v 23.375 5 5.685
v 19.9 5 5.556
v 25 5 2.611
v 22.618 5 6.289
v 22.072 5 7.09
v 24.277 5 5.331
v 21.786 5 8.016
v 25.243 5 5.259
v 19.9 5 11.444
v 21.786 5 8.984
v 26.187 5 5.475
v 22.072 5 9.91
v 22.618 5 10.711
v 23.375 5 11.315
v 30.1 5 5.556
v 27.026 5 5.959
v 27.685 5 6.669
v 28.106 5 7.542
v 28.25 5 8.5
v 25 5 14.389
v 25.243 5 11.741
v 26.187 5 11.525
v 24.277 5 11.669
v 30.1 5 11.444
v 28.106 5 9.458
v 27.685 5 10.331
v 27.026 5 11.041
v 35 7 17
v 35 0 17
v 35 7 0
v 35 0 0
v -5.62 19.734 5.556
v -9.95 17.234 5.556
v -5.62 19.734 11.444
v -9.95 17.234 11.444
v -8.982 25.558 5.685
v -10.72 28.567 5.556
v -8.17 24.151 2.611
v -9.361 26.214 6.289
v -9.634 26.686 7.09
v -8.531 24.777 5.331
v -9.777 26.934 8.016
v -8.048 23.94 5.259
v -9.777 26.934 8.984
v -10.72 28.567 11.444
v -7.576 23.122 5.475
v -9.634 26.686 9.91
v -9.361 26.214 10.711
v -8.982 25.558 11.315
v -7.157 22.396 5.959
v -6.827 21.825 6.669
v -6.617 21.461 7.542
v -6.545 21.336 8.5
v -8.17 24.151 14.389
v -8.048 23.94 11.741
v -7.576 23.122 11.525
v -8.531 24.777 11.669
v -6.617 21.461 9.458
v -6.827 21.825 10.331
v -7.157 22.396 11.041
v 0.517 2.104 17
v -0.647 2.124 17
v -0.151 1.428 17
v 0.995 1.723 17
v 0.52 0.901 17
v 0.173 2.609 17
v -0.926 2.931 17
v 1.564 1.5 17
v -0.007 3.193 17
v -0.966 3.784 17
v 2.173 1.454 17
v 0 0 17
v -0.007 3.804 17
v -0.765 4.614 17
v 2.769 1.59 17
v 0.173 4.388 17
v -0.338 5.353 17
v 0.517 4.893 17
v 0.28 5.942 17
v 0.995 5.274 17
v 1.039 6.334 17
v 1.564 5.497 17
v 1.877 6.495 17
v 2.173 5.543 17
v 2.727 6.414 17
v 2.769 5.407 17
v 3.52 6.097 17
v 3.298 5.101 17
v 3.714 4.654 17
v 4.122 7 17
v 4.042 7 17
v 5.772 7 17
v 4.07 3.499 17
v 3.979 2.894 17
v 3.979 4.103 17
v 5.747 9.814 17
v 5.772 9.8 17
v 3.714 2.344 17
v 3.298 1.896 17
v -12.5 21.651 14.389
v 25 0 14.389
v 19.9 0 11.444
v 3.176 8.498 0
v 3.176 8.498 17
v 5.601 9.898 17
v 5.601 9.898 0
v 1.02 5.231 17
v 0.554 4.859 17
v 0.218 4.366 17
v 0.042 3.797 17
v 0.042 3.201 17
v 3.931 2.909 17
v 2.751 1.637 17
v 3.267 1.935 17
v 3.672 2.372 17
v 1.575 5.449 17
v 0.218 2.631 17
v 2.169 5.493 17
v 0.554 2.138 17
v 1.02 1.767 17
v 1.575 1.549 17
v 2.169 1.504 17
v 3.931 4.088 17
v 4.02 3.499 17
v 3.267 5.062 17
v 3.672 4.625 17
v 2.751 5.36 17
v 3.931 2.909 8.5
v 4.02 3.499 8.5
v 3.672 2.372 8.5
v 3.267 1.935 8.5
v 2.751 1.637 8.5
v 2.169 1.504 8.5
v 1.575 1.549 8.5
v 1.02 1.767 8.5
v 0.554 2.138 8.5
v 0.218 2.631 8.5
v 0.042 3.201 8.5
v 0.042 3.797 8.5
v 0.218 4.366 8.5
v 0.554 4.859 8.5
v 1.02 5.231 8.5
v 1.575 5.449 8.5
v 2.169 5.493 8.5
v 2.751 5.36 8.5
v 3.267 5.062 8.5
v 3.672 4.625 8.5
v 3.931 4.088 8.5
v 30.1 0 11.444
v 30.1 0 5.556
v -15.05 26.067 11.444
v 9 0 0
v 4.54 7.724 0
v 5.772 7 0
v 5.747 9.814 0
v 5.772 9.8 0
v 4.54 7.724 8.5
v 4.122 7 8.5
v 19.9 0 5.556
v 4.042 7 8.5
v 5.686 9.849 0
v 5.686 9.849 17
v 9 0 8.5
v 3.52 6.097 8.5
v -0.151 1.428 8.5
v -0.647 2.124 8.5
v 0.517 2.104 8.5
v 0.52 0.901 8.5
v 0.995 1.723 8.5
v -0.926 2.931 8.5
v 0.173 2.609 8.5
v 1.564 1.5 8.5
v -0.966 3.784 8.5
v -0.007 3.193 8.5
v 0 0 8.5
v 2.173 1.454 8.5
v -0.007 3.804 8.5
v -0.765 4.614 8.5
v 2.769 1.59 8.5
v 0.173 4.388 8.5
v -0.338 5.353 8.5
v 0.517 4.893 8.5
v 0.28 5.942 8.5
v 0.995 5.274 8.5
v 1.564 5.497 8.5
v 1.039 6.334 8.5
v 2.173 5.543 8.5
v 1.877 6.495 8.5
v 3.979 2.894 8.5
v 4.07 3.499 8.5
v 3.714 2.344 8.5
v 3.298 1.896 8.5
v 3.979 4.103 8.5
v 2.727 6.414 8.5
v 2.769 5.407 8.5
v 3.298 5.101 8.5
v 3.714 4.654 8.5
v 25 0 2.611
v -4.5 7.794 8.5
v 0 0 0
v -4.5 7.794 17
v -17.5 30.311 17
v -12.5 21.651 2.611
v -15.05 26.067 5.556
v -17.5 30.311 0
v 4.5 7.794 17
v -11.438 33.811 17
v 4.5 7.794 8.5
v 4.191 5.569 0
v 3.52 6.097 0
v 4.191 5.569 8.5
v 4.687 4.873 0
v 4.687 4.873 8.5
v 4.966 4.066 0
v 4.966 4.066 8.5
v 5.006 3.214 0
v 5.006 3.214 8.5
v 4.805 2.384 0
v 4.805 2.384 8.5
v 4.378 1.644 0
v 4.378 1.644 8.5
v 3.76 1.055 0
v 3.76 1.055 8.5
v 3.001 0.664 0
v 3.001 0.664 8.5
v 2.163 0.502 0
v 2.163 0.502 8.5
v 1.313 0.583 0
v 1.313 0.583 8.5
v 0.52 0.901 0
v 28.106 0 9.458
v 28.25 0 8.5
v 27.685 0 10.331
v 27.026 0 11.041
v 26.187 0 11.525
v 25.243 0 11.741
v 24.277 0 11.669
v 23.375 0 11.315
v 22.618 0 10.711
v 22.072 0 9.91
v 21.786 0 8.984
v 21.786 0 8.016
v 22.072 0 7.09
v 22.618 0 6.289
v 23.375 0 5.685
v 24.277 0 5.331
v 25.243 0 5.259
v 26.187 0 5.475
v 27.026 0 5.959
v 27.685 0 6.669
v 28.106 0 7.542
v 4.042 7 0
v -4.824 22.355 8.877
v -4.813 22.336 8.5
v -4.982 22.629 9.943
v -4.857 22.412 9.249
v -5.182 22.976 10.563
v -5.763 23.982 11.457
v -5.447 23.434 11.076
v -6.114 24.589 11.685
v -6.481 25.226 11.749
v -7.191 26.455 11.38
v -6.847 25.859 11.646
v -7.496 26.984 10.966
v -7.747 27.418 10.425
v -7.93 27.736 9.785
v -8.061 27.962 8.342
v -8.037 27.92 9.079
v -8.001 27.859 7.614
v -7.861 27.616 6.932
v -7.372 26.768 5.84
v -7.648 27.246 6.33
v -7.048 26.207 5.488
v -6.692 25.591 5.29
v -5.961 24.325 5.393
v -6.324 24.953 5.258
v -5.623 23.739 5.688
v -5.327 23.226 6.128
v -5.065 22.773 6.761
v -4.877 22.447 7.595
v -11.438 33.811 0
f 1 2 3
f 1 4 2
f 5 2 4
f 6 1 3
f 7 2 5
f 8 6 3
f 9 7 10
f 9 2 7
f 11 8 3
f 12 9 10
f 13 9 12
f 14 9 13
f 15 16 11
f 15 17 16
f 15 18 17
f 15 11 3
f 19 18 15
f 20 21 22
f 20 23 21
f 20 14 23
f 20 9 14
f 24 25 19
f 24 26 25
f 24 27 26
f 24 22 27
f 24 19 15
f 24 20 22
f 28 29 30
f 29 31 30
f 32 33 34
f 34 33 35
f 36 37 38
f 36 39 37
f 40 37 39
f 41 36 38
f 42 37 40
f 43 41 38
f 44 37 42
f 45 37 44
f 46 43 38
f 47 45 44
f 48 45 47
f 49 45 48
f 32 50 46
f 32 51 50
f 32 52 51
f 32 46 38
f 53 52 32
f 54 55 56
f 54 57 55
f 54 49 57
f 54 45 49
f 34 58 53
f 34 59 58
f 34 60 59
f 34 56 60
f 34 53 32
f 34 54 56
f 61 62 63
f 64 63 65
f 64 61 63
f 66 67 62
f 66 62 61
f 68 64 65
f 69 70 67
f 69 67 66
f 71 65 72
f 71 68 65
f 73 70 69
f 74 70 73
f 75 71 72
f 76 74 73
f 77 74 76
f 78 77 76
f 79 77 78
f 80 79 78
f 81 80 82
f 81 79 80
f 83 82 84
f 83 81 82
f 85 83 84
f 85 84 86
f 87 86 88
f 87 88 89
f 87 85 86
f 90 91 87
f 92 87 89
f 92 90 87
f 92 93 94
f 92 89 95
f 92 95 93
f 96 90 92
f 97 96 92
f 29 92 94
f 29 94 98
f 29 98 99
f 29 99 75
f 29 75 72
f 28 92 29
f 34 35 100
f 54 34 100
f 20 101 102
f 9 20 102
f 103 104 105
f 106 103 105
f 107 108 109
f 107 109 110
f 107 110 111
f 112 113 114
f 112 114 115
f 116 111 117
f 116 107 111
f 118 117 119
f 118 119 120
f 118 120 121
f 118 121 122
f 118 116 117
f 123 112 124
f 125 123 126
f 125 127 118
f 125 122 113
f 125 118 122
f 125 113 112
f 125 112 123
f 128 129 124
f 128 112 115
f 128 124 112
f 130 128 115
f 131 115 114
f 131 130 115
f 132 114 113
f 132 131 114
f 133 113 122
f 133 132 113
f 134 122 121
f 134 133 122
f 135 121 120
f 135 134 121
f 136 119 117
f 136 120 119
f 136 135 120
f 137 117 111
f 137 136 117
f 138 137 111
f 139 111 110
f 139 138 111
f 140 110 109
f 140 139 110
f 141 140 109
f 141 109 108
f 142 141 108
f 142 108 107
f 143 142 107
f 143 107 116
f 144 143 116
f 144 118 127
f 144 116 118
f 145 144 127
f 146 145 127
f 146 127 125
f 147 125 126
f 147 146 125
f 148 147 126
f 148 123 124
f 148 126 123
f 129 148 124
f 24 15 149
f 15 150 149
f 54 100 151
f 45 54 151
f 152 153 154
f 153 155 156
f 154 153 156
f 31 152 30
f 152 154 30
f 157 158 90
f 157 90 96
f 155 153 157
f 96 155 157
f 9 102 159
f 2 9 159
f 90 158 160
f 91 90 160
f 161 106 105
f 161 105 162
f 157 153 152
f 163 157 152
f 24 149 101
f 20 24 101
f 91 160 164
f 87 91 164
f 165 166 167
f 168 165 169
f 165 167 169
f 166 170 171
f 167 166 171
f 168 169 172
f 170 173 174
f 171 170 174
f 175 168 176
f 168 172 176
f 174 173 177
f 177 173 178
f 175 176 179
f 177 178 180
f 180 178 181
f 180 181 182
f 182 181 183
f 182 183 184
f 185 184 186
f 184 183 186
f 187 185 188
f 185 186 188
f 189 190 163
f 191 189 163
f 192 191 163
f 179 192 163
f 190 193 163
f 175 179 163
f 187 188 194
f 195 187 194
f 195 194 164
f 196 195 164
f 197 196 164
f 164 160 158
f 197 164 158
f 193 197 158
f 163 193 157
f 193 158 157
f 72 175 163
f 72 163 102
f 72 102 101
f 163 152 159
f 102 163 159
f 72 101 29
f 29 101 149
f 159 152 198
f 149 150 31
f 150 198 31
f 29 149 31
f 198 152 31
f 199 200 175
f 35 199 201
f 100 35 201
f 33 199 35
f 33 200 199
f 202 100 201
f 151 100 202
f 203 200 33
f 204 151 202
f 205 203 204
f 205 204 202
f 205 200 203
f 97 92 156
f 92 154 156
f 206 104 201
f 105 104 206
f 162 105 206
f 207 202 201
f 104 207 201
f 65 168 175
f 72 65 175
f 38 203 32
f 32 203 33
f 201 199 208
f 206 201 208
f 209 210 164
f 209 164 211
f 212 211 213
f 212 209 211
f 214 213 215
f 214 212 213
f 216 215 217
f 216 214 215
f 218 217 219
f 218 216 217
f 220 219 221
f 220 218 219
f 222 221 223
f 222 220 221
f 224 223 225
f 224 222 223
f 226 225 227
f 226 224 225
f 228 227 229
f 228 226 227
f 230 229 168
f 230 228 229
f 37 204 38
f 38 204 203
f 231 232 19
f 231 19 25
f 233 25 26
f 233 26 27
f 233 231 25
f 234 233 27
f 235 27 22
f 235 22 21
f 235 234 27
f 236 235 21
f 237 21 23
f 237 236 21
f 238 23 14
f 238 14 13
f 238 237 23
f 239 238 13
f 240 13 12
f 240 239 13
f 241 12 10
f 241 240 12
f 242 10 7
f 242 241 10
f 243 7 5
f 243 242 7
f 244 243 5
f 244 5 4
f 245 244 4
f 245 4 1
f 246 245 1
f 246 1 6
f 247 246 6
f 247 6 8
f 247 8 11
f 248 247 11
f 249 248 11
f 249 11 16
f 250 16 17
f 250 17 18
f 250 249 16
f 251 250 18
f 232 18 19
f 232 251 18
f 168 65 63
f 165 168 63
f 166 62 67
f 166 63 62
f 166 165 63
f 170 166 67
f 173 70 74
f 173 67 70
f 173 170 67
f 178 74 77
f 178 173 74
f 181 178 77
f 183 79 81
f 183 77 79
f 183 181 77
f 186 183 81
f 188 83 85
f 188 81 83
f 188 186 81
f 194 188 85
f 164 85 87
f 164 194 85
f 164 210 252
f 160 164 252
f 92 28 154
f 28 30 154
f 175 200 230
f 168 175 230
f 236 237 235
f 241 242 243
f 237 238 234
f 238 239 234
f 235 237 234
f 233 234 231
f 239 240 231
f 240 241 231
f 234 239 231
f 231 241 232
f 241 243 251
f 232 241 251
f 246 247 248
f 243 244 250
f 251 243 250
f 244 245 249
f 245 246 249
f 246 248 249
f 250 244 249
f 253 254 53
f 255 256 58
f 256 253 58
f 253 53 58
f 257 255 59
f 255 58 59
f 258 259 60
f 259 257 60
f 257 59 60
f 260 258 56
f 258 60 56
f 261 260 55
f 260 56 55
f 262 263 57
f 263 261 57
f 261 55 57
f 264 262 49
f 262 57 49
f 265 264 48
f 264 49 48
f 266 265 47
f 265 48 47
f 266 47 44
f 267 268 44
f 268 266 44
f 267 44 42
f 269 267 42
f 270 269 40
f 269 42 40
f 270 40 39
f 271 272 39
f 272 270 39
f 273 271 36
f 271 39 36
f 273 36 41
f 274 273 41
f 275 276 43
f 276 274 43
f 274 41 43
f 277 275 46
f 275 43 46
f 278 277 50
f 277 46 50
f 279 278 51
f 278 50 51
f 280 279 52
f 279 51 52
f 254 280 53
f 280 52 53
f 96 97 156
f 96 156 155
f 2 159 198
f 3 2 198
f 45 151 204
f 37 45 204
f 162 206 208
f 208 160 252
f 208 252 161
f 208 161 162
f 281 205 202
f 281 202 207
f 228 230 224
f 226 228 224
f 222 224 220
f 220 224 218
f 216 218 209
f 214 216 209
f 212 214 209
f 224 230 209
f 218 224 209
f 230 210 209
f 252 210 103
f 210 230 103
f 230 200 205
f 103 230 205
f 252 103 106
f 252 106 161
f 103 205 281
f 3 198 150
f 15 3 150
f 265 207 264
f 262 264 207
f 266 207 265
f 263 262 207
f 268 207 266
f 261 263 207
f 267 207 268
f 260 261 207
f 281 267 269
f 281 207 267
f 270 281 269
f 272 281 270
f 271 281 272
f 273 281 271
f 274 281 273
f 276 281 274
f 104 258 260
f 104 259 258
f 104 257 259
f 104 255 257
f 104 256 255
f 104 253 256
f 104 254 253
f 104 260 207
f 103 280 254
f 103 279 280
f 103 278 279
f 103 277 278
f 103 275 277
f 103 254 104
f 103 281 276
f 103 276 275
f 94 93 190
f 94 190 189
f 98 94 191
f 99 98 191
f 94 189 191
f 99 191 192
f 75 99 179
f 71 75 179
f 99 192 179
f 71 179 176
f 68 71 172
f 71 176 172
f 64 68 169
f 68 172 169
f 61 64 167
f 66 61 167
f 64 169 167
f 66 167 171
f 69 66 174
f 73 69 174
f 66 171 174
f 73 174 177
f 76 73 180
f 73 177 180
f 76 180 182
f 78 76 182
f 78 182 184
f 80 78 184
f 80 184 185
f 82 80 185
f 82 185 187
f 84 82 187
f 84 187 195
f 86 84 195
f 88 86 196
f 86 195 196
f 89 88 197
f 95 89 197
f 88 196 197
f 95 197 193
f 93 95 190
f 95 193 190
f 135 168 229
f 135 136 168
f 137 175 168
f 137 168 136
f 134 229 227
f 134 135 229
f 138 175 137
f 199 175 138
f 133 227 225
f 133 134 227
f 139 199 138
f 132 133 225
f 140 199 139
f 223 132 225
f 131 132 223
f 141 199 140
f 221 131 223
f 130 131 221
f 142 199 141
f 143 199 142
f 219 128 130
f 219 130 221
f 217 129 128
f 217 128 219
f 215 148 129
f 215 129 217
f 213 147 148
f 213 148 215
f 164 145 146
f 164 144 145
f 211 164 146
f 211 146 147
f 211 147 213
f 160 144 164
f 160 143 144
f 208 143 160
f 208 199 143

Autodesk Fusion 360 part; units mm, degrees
sketch "Szkic1" plane through (0, 0, 0) normal (0, 0, 1) x (1, 0, 0) in component "Component"
  line L0 (0, 0) -> (50, 0) construction
  line L1 (0, 0) -> (-17.5, 30.3109)
  line L2 (0, 0) -> (25, 0) construction
  line L3 (-17.5, 30.3109) -> (-11.4378, 33.8109)
  line L4 (-11.4378, 33.8109) -> (4.0415, 7)
  line L5 (0, 0) -> (4.0415, 7)
  line L6 (0, 0) -> (8.0829, 0) construction
  line L7 (4.0415, 7) -> (3.1765, 8.4982) construction
  line L8 (3.1765, 8.4982) -> (5.6013, 9.8982)
  line L9 (4.0415, 7) -> (5.6865, 9.8492)
  line L10 (4.0415, 7) -> (7.2746, 7) construction
  line L11 (5.6013, 9.8982) -> (5.6865, 9.8492)
  circle A0 centre (2.02, 3.4987) radius 3
  circle A1 centre (2.02, 3.4987) radius 2
  line L12 (-4.5, 7.7942) -> (4.5, 7.7942)
  dimension "d1" = 120
  dimension "d2" = 35
  dimension "d3" = 7
  dimension "d5" = 60
  dimension "d7" = 1.73
  dimension "d8" = 2.8
  dimension "d9" = 60
  dimension "d11" = 3.29
  dimension "d12" = 6
  dimension "d13" = 4.04
  dimension "d15" = 4
  dimension "d29" = 60
  dimension "d30" = 9
extrude "Wyciągnięcie proste1" add sketch "Szkic1" along normal blind 17 makes body 1 in component "Component"
extrude "Wyciągnięcie proste2" cut sketch "Szkic1" along normal blind 17 contours L5 A0 A1 | L5 A0 A1 bodies 1 makes body 2 at (4.0101, 3.2996, 11.3333) in component "Component"
extrude "Wyciągnięcie proste3" add sketch "Szkic1" along normal blind 7 contours L5 A0 A1 | L5 A0 A1 bodies 1 2 in component "Component"
extrude "Wyciągnięcie proste4" cut sketch "Szkic1" along normal blind 17 contours L1 L4 L5 A0 L12 bodies 1 makes body 3 at (-6.5664, 25.3733, 5.6667) in component "Component"
extrude "Wyciągnięcie proste5" add sketch "Szkic1" along normal blind 7 contours L1 L4 L5 A0 L12 bodies 1 3 in component "Component"
extrude "Wyciągnięcie proste6" add 1 faces at (0.1241, 6.983, 7) along direction (0, 0, 1) blind 10 on bodies 1 bodies 1 in component "Component"
extrude "Wyciągnięcie proste7" cut sketch "Szkic1" along normal blind 19 contours L1 L4 L5 A0 L12 bodies 1 makes body 4 at (0.2688, 1.0629, 8) in component "Component"
extrude "Wyciągnięcie proste8" add sketch "Szkic1" along normal blind 8.5 contours L1 L4 L5 A0 L12 bodies 1 4 in component "Component"
extrude "Wyciągnięcie proste9" cut sketch "Szkic1" along normal blind 17 contours L5 A0 A1 | L5 A0 A1 | L4 L9 L12 bodies 1 makes body 5 at (4.0101, 3.2996, 5.6667) in component "Component"
extrude "Wyciągnięcie proste10" add sketch "Szkic1" along normal blind 8.5 contours L5 A0 A1 | L5 A0 A1 | L4 L9 L12 bodies 1 5 in component "Component"
sketch "Szkic1 (2)" plane through (0, 0, 0) normal (0, 0, 1) x (1, 0, 0) in component "Component'"
  line L0 (0, 0) -> (35, 0)
  line L1 (35, 0) -> (35, 7)
  line L2 (35, 7) -> (4.0415, 7)
  line L3 (4.0415, 7) -> (0, 0)
  line L4 (4.0415, 7) -> (5.6865, 9.8492)
  line L5 (4.0415, 7) -> (5.7715, 7) construction
  line L6 (5.7715, 7) -> (5.7715, 9.8)
  line L7 (5.7715, 9.8) -> (5.6865, 9.8492)
  circle A0 centre (2.02, 3.4987) radius 2.05
  line L8 (0, 0) -> (0.52, 0.9007)
  circle A1 centre (2.02, 3.4987) radius 3
  line L9 (4.5, 7.7942) -> (9, 0)
  line L10 (4.0415, 7) -> (4.1021, 6.965) construction
  line L11 (4.1021, 6.965) -> (5.747, 9.8141)
  point P0 (4.0415, 7)
  point P1 (5.6865, 9.8492)
  point P2 (2.02, 3.4987)
  point P3 (2.02, 3.4987)
  point P4 (4.5, 7.7942)
  dimension "d41" = 35
  dimension "d42" = 7
  dimension "d43" = 1.73
  dimension "d44" = 2.8
  dimension "d45" = 4.04
  dimension "d46" = 4.1
  dimension "d48" = 1.04
  dimension "d49" = 6
  dimension "d50" = 60
  dimension "d78" = 120.075
  dimension "d79" = 0.07
extrude "Wyciągnięcie proste1'" add sketch "Szkic1 (2)" along normal blind 17 separate body makes body 6 in component "Component'"
extrude "Wyciągnięcie proste2'" cut sketch "Szkic1 (2)" along normal blind 8.5 contours L0 L2 L3 L8 A1 L9 | L3 A0 A1 | L3 A0 A1 | L2 L9 L11 | L3 A0 | L3 A0 | L2 L4 L9 L11 bodies 6 in component "Component'"
extrude "Wyciągnięcie proste3'" cut sketch "Szkic1 (2)" along normal through all contours L3 A0 | L3 A0 bodies 6 in component "Component'"
sketch "Szkic2" plane through (0, 0, 0) normal (0, -1, 0) x (1, 0, 0) in component "Component'"
  line L0 (9, 8.5) -> (9, 0)
  line L1 (9, 0) -> (35, 0)
  line L2 (35, 0) -> (35, 17)
  line L3 (35, 17) -> (0, 17)
  line L4 (0, 17) -> (0, 8.5)
  line L5 (0, 8.5) -> (9, 8.5)
  line L6 (0, 0) -> (25, 0) construction
  line L7 (25, 0) -> (25, 8.5) construction
  line L8 (30.1, 11.4445) -> (25, 14.389)
  line L9 (25, 14.389) -> (19.9, 11.4445)
  line L10 (19.9, 11.4445) -> (19.9, 5.5555)
  line L11 (19.9, 5.5555) -> (25, 2.611)
  line L12 (25, 2.611) -> (30.1, 5.5555)
  line L13 (30.1, 5.5555) -> (30.1, 11.4445)
  circle A0 centre (25, 8.5) radius 3.25
  point P0 (25, 8.5)
  point P1 (25, 0)
  dimension "d62" = 25
  dimension "d63" = 8.5
  dimension "d64" = 5.1
  dimension "d67" = 6.5
extrude "Wyciągnięcie proste4'" cut sketch "Szkic2" along normal through all contours A0 bodies 6 in component "Component'"
extrude "Wyciągnięcie proste5'" cut sketch "Szkic2" against normal blind 5 contours L8 L9 L10 L11 L12 L13 bodies 6 in component "Component'"
sketch "Szkic2 (2)" plane through (0, 0, 0) normal (-0.866, -0.5, 0) x (0.5, -0.866, 0) in component "Component"
  line L0 (-9, 8.5) -> (-9, 17)
  line L1 (-9, 17) -> (-35, 17)
  line L2 (-35, 17) -> (-35, 0)
  line L3 (-35, 0) -> (0, 0)
  line L4 (0, 0) -> (0, 8.5)
  line L5 (0, 8.5) -> (-9, 8.5)
  line L6 (0, 0) -> (-25, 0) construction
  line L7 (-25, 0) -> (-25, 8.5) construction
  line L8 (-19.9, 11.4445) -> (-25, 14.389)
  line L9 (-25, 14.389) -> (-30.1, 11.4445)
  line L10 (-30.1, 11.4445) -> (-30.1, 5.5555)
  line L11 (-30.1, 5.5555) -> (-25, 2.611)
  line L12 (-25, 2.611) -> (-19.9, 5.5555)
  line L13 (-19.9, 5.5555) -> (-19.9, 11.4445)
  circle A0 centre (-25, 8.5) radius 3.25
  point P0 (-25, 8.5)
  dimension "d71" = 25
  dimension "d72" = 8.5
  dimension "d73" = 5.1
  dimension "d74" = 6.5
extrude "Wyciągnięcie proste11" cut sketch "Szkic2 (2)" against normal blind 5 contours L8 L9 L10 L11 L12 L13 bodies 1 in component "Component"
extrude "Wyciągnięcie proste12" cut 1 faces at (-12.97, 22.4647, 8.1878) along direction (0.866025, 0.5, 0) through all on bodies 1 bodies 1 in component "Component"
extrude "Wyciągnięcie proste6'" cut sketch "Szkic1 (2)" along normal through all contours L2 L4 L9 L11 | L4 L7 L9 L11 bodies 6 in component "Component'"
component "Component" placed x (1, 0, 0) y (0, 1, 0) z (0, 0, 1) at (0, 0, 0)
component "Component'" placed x (1, 0, 0) y (0, 1, 0) z (0, 0, 1) at (0, 0, 0)
